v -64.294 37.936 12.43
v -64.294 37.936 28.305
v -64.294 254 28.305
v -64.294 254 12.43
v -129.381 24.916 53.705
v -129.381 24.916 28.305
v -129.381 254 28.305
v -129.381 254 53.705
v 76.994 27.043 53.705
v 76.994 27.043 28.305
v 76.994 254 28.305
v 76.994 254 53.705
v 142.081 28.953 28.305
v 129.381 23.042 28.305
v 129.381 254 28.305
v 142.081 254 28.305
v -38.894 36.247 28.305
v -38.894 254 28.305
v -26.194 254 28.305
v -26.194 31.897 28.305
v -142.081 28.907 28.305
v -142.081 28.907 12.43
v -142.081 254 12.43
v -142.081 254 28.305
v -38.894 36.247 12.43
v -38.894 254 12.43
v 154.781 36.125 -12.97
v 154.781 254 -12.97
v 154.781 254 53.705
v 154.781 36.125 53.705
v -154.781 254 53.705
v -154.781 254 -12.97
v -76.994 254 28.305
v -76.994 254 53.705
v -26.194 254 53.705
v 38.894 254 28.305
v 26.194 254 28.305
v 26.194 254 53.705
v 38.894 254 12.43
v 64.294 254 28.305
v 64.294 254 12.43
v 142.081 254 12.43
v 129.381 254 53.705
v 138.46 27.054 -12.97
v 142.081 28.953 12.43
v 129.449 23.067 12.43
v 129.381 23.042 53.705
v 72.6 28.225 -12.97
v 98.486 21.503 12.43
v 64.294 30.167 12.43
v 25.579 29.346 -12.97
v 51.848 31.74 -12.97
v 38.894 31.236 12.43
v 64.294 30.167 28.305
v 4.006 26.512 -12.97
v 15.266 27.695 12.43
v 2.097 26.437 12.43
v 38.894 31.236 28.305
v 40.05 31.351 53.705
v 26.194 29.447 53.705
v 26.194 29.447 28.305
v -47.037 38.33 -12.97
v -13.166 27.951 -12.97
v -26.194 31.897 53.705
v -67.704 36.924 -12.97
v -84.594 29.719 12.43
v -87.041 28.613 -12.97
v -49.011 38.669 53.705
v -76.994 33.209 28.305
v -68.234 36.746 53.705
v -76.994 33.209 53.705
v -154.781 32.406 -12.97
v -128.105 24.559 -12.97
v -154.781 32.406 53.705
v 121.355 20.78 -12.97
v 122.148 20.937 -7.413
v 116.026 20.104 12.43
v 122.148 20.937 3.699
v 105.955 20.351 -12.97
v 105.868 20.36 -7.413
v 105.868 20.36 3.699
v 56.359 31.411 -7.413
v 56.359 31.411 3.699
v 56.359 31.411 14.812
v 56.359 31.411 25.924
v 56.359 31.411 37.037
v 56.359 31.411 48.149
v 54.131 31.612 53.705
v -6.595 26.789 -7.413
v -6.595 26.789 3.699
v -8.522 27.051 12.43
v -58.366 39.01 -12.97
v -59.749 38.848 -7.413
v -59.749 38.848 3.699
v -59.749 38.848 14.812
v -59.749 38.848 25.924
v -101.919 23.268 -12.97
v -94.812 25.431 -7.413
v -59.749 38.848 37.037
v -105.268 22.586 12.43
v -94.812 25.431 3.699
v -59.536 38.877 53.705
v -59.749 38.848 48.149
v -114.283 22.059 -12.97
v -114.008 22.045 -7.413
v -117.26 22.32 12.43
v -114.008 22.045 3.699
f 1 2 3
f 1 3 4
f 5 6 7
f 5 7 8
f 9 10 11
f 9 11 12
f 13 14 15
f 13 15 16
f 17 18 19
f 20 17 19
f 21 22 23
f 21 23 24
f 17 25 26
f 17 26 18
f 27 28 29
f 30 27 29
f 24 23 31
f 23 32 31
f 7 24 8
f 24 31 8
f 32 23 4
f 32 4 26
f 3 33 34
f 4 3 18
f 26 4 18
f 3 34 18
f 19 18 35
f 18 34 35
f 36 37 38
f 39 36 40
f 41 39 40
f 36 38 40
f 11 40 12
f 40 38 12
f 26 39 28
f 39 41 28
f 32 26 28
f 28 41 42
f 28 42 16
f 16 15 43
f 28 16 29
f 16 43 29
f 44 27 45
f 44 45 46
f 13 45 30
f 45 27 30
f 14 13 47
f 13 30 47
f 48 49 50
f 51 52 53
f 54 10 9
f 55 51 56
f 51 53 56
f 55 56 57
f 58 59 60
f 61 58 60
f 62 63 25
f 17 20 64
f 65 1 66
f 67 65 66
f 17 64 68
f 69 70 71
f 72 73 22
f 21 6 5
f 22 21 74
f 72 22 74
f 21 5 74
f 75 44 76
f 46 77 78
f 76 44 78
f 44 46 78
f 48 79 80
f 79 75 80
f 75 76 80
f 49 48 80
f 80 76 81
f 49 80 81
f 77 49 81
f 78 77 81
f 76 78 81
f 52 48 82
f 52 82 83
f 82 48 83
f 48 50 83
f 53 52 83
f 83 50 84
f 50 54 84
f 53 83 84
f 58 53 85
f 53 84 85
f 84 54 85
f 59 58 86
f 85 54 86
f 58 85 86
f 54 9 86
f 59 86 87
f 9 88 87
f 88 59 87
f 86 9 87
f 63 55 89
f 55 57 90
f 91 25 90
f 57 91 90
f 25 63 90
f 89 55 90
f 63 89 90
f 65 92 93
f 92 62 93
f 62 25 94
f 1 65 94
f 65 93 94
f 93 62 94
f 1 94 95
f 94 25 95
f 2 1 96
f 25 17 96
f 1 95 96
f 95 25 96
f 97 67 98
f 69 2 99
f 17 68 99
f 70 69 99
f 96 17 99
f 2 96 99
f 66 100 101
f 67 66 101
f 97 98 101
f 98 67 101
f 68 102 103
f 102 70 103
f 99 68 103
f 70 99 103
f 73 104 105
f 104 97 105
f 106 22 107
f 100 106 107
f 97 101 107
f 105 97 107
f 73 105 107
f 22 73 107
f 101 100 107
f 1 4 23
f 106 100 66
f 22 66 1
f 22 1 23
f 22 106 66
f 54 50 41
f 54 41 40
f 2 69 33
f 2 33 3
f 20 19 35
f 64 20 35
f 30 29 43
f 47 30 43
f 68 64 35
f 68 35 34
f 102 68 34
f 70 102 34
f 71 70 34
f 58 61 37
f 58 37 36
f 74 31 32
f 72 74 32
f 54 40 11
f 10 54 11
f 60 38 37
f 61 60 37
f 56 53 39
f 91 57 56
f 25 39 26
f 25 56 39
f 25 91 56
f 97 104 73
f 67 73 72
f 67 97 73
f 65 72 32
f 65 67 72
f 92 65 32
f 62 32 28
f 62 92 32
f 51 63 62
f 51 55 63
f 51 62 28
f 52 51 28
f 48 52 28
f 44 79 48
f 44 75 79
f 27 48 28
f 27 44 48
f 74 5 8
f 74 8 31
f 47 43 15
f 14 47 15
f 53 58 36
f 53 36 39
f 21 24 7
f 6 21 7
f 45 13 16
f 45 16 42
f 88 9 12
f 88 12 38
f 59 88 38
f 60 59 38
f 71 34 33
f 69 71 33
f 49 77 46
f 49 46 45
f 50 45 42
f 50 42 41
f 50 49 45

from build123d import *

# Parameters (mm, degrees)
F1_DEPTH = 254
F3_DEPTH = 66.676


with BuildPart() as f1:
    # F0 (on Front) → F1 (new body)
    with BuildSketch(Plane.XZ):
        Polygon((-26.19375, 53.70542624), (-76.99375, 53.70542624), (-76.99375, 28.30542624), (-64.29375, 28.30542624), (-64.29375, 12.43042624), (-142.08125, 12.43042624), (-142.08125, 28.30542624), (-129.38125, 28.30542624), (-129.38125, 53.70542624), (-154.78125, 53.70542624), (-154.78125, -12.96957376), (154.78125, -12.96957376), (154.78125, 53.70542624), (129.38125, 53.70542624), (129.38125, 28.30542624), (142.08125, 28.30542624), (142.08125, 12.43042624), (64.29375, 12.43042624), (64.29375, 28.30542624), (76.99375, 28.30542624), (76.99375, 53.70542624), (26.19375, 53.70542624), (26.19375, 28.30542624), (38.89375, 28.30542624), (38.89375, 12.43042624), (-38.89375, 12.43042624), (-38.89375, 28.30542624), (-26.19375, 28.30542624), align=None)
    extrude(amount=-F1_DEPTH)

    # F2 (on face) → F3 (cut, through all)
    with BuildSketch(Plane.XY.offset(53.70542624)):
        with BuildLine():
            add(Edge.make_bspline(
                [(-154.78125, 32.4057105541), (-161.3820856153, 33.7240346902), (-167.4622688116, 33.7918364426), (-172.5781410933, 31.0451351106)],
                knots=[0.9725895217, 0.9725895217, 0.9725895217, 0.9725895217, 1, 1, 1, 1], degree=3))
            add(Edge.make_bspline(
                [(-172.5781410933, 31.0451351106), (-190.5837742788, 21.3779475948), (-206.548638448, -95.9305426075), (46.1224753389, -114.1329365661), (210.5723641603, -23.7304349242), (197.6998905874, 15.9901854584), (176.4646847288, 59.1142675947), (121.1629727518, 4.0554010168), (55.1169182274, 42.5163631419), (-6.3789956434, 16.3841903104), (-59.0766721453, 52.5753852836), (-97.0494233849, 17.5440899141), (-123.6584021709, 23.2823267626), (-129.38125, 24.9158726552)],
                knots=[0, 0, 0, 0, 0.0964728966, 0.2541376325, 0.3925903757, 0.4508749111, 0.5117298667, 0.5914863461, 0.6787303481, 0.7613694942, 0.8381938102, 0.9177486309, 0.9395013052, 0.9395013052, 0.9395013052, 0.9395013052], degree=3))
            Line((-129.38125, 24.9158726552), (-129.38125, 0))
            Line((-129.38125, 0), (-154.78125, 0))
            Line((-154.78125, 0), (-154.78125, 32.4057105541))
        make_face()
        with BuildLine():
            Line((-129.38125, 0), (-129.38125, 24.9158726552))
            add(Edge.make_bspline(
                [(-129.38125, 24.9158726552), (-138.0863326676, 27.4006761064), (-146.8131337318, 30.814312039), (-154.78125, 32.4057105541)],
                knots=[0.9395013052, 0.9395013052, 0.9395013052, 0.9395013052, 0.9725895217, 0.9725895217, 0.9725895217, 0.9725895217], degree=3))
            Line((-154.78125, 32.4057105541), (-154.78125, 0))
            Line((-154.78125, 0), (-129.38125, 0))
        make_face()
    extrude(amount=-F3_DEPTH, mode=Mode.SUBTRACT)


solid = f1.part
